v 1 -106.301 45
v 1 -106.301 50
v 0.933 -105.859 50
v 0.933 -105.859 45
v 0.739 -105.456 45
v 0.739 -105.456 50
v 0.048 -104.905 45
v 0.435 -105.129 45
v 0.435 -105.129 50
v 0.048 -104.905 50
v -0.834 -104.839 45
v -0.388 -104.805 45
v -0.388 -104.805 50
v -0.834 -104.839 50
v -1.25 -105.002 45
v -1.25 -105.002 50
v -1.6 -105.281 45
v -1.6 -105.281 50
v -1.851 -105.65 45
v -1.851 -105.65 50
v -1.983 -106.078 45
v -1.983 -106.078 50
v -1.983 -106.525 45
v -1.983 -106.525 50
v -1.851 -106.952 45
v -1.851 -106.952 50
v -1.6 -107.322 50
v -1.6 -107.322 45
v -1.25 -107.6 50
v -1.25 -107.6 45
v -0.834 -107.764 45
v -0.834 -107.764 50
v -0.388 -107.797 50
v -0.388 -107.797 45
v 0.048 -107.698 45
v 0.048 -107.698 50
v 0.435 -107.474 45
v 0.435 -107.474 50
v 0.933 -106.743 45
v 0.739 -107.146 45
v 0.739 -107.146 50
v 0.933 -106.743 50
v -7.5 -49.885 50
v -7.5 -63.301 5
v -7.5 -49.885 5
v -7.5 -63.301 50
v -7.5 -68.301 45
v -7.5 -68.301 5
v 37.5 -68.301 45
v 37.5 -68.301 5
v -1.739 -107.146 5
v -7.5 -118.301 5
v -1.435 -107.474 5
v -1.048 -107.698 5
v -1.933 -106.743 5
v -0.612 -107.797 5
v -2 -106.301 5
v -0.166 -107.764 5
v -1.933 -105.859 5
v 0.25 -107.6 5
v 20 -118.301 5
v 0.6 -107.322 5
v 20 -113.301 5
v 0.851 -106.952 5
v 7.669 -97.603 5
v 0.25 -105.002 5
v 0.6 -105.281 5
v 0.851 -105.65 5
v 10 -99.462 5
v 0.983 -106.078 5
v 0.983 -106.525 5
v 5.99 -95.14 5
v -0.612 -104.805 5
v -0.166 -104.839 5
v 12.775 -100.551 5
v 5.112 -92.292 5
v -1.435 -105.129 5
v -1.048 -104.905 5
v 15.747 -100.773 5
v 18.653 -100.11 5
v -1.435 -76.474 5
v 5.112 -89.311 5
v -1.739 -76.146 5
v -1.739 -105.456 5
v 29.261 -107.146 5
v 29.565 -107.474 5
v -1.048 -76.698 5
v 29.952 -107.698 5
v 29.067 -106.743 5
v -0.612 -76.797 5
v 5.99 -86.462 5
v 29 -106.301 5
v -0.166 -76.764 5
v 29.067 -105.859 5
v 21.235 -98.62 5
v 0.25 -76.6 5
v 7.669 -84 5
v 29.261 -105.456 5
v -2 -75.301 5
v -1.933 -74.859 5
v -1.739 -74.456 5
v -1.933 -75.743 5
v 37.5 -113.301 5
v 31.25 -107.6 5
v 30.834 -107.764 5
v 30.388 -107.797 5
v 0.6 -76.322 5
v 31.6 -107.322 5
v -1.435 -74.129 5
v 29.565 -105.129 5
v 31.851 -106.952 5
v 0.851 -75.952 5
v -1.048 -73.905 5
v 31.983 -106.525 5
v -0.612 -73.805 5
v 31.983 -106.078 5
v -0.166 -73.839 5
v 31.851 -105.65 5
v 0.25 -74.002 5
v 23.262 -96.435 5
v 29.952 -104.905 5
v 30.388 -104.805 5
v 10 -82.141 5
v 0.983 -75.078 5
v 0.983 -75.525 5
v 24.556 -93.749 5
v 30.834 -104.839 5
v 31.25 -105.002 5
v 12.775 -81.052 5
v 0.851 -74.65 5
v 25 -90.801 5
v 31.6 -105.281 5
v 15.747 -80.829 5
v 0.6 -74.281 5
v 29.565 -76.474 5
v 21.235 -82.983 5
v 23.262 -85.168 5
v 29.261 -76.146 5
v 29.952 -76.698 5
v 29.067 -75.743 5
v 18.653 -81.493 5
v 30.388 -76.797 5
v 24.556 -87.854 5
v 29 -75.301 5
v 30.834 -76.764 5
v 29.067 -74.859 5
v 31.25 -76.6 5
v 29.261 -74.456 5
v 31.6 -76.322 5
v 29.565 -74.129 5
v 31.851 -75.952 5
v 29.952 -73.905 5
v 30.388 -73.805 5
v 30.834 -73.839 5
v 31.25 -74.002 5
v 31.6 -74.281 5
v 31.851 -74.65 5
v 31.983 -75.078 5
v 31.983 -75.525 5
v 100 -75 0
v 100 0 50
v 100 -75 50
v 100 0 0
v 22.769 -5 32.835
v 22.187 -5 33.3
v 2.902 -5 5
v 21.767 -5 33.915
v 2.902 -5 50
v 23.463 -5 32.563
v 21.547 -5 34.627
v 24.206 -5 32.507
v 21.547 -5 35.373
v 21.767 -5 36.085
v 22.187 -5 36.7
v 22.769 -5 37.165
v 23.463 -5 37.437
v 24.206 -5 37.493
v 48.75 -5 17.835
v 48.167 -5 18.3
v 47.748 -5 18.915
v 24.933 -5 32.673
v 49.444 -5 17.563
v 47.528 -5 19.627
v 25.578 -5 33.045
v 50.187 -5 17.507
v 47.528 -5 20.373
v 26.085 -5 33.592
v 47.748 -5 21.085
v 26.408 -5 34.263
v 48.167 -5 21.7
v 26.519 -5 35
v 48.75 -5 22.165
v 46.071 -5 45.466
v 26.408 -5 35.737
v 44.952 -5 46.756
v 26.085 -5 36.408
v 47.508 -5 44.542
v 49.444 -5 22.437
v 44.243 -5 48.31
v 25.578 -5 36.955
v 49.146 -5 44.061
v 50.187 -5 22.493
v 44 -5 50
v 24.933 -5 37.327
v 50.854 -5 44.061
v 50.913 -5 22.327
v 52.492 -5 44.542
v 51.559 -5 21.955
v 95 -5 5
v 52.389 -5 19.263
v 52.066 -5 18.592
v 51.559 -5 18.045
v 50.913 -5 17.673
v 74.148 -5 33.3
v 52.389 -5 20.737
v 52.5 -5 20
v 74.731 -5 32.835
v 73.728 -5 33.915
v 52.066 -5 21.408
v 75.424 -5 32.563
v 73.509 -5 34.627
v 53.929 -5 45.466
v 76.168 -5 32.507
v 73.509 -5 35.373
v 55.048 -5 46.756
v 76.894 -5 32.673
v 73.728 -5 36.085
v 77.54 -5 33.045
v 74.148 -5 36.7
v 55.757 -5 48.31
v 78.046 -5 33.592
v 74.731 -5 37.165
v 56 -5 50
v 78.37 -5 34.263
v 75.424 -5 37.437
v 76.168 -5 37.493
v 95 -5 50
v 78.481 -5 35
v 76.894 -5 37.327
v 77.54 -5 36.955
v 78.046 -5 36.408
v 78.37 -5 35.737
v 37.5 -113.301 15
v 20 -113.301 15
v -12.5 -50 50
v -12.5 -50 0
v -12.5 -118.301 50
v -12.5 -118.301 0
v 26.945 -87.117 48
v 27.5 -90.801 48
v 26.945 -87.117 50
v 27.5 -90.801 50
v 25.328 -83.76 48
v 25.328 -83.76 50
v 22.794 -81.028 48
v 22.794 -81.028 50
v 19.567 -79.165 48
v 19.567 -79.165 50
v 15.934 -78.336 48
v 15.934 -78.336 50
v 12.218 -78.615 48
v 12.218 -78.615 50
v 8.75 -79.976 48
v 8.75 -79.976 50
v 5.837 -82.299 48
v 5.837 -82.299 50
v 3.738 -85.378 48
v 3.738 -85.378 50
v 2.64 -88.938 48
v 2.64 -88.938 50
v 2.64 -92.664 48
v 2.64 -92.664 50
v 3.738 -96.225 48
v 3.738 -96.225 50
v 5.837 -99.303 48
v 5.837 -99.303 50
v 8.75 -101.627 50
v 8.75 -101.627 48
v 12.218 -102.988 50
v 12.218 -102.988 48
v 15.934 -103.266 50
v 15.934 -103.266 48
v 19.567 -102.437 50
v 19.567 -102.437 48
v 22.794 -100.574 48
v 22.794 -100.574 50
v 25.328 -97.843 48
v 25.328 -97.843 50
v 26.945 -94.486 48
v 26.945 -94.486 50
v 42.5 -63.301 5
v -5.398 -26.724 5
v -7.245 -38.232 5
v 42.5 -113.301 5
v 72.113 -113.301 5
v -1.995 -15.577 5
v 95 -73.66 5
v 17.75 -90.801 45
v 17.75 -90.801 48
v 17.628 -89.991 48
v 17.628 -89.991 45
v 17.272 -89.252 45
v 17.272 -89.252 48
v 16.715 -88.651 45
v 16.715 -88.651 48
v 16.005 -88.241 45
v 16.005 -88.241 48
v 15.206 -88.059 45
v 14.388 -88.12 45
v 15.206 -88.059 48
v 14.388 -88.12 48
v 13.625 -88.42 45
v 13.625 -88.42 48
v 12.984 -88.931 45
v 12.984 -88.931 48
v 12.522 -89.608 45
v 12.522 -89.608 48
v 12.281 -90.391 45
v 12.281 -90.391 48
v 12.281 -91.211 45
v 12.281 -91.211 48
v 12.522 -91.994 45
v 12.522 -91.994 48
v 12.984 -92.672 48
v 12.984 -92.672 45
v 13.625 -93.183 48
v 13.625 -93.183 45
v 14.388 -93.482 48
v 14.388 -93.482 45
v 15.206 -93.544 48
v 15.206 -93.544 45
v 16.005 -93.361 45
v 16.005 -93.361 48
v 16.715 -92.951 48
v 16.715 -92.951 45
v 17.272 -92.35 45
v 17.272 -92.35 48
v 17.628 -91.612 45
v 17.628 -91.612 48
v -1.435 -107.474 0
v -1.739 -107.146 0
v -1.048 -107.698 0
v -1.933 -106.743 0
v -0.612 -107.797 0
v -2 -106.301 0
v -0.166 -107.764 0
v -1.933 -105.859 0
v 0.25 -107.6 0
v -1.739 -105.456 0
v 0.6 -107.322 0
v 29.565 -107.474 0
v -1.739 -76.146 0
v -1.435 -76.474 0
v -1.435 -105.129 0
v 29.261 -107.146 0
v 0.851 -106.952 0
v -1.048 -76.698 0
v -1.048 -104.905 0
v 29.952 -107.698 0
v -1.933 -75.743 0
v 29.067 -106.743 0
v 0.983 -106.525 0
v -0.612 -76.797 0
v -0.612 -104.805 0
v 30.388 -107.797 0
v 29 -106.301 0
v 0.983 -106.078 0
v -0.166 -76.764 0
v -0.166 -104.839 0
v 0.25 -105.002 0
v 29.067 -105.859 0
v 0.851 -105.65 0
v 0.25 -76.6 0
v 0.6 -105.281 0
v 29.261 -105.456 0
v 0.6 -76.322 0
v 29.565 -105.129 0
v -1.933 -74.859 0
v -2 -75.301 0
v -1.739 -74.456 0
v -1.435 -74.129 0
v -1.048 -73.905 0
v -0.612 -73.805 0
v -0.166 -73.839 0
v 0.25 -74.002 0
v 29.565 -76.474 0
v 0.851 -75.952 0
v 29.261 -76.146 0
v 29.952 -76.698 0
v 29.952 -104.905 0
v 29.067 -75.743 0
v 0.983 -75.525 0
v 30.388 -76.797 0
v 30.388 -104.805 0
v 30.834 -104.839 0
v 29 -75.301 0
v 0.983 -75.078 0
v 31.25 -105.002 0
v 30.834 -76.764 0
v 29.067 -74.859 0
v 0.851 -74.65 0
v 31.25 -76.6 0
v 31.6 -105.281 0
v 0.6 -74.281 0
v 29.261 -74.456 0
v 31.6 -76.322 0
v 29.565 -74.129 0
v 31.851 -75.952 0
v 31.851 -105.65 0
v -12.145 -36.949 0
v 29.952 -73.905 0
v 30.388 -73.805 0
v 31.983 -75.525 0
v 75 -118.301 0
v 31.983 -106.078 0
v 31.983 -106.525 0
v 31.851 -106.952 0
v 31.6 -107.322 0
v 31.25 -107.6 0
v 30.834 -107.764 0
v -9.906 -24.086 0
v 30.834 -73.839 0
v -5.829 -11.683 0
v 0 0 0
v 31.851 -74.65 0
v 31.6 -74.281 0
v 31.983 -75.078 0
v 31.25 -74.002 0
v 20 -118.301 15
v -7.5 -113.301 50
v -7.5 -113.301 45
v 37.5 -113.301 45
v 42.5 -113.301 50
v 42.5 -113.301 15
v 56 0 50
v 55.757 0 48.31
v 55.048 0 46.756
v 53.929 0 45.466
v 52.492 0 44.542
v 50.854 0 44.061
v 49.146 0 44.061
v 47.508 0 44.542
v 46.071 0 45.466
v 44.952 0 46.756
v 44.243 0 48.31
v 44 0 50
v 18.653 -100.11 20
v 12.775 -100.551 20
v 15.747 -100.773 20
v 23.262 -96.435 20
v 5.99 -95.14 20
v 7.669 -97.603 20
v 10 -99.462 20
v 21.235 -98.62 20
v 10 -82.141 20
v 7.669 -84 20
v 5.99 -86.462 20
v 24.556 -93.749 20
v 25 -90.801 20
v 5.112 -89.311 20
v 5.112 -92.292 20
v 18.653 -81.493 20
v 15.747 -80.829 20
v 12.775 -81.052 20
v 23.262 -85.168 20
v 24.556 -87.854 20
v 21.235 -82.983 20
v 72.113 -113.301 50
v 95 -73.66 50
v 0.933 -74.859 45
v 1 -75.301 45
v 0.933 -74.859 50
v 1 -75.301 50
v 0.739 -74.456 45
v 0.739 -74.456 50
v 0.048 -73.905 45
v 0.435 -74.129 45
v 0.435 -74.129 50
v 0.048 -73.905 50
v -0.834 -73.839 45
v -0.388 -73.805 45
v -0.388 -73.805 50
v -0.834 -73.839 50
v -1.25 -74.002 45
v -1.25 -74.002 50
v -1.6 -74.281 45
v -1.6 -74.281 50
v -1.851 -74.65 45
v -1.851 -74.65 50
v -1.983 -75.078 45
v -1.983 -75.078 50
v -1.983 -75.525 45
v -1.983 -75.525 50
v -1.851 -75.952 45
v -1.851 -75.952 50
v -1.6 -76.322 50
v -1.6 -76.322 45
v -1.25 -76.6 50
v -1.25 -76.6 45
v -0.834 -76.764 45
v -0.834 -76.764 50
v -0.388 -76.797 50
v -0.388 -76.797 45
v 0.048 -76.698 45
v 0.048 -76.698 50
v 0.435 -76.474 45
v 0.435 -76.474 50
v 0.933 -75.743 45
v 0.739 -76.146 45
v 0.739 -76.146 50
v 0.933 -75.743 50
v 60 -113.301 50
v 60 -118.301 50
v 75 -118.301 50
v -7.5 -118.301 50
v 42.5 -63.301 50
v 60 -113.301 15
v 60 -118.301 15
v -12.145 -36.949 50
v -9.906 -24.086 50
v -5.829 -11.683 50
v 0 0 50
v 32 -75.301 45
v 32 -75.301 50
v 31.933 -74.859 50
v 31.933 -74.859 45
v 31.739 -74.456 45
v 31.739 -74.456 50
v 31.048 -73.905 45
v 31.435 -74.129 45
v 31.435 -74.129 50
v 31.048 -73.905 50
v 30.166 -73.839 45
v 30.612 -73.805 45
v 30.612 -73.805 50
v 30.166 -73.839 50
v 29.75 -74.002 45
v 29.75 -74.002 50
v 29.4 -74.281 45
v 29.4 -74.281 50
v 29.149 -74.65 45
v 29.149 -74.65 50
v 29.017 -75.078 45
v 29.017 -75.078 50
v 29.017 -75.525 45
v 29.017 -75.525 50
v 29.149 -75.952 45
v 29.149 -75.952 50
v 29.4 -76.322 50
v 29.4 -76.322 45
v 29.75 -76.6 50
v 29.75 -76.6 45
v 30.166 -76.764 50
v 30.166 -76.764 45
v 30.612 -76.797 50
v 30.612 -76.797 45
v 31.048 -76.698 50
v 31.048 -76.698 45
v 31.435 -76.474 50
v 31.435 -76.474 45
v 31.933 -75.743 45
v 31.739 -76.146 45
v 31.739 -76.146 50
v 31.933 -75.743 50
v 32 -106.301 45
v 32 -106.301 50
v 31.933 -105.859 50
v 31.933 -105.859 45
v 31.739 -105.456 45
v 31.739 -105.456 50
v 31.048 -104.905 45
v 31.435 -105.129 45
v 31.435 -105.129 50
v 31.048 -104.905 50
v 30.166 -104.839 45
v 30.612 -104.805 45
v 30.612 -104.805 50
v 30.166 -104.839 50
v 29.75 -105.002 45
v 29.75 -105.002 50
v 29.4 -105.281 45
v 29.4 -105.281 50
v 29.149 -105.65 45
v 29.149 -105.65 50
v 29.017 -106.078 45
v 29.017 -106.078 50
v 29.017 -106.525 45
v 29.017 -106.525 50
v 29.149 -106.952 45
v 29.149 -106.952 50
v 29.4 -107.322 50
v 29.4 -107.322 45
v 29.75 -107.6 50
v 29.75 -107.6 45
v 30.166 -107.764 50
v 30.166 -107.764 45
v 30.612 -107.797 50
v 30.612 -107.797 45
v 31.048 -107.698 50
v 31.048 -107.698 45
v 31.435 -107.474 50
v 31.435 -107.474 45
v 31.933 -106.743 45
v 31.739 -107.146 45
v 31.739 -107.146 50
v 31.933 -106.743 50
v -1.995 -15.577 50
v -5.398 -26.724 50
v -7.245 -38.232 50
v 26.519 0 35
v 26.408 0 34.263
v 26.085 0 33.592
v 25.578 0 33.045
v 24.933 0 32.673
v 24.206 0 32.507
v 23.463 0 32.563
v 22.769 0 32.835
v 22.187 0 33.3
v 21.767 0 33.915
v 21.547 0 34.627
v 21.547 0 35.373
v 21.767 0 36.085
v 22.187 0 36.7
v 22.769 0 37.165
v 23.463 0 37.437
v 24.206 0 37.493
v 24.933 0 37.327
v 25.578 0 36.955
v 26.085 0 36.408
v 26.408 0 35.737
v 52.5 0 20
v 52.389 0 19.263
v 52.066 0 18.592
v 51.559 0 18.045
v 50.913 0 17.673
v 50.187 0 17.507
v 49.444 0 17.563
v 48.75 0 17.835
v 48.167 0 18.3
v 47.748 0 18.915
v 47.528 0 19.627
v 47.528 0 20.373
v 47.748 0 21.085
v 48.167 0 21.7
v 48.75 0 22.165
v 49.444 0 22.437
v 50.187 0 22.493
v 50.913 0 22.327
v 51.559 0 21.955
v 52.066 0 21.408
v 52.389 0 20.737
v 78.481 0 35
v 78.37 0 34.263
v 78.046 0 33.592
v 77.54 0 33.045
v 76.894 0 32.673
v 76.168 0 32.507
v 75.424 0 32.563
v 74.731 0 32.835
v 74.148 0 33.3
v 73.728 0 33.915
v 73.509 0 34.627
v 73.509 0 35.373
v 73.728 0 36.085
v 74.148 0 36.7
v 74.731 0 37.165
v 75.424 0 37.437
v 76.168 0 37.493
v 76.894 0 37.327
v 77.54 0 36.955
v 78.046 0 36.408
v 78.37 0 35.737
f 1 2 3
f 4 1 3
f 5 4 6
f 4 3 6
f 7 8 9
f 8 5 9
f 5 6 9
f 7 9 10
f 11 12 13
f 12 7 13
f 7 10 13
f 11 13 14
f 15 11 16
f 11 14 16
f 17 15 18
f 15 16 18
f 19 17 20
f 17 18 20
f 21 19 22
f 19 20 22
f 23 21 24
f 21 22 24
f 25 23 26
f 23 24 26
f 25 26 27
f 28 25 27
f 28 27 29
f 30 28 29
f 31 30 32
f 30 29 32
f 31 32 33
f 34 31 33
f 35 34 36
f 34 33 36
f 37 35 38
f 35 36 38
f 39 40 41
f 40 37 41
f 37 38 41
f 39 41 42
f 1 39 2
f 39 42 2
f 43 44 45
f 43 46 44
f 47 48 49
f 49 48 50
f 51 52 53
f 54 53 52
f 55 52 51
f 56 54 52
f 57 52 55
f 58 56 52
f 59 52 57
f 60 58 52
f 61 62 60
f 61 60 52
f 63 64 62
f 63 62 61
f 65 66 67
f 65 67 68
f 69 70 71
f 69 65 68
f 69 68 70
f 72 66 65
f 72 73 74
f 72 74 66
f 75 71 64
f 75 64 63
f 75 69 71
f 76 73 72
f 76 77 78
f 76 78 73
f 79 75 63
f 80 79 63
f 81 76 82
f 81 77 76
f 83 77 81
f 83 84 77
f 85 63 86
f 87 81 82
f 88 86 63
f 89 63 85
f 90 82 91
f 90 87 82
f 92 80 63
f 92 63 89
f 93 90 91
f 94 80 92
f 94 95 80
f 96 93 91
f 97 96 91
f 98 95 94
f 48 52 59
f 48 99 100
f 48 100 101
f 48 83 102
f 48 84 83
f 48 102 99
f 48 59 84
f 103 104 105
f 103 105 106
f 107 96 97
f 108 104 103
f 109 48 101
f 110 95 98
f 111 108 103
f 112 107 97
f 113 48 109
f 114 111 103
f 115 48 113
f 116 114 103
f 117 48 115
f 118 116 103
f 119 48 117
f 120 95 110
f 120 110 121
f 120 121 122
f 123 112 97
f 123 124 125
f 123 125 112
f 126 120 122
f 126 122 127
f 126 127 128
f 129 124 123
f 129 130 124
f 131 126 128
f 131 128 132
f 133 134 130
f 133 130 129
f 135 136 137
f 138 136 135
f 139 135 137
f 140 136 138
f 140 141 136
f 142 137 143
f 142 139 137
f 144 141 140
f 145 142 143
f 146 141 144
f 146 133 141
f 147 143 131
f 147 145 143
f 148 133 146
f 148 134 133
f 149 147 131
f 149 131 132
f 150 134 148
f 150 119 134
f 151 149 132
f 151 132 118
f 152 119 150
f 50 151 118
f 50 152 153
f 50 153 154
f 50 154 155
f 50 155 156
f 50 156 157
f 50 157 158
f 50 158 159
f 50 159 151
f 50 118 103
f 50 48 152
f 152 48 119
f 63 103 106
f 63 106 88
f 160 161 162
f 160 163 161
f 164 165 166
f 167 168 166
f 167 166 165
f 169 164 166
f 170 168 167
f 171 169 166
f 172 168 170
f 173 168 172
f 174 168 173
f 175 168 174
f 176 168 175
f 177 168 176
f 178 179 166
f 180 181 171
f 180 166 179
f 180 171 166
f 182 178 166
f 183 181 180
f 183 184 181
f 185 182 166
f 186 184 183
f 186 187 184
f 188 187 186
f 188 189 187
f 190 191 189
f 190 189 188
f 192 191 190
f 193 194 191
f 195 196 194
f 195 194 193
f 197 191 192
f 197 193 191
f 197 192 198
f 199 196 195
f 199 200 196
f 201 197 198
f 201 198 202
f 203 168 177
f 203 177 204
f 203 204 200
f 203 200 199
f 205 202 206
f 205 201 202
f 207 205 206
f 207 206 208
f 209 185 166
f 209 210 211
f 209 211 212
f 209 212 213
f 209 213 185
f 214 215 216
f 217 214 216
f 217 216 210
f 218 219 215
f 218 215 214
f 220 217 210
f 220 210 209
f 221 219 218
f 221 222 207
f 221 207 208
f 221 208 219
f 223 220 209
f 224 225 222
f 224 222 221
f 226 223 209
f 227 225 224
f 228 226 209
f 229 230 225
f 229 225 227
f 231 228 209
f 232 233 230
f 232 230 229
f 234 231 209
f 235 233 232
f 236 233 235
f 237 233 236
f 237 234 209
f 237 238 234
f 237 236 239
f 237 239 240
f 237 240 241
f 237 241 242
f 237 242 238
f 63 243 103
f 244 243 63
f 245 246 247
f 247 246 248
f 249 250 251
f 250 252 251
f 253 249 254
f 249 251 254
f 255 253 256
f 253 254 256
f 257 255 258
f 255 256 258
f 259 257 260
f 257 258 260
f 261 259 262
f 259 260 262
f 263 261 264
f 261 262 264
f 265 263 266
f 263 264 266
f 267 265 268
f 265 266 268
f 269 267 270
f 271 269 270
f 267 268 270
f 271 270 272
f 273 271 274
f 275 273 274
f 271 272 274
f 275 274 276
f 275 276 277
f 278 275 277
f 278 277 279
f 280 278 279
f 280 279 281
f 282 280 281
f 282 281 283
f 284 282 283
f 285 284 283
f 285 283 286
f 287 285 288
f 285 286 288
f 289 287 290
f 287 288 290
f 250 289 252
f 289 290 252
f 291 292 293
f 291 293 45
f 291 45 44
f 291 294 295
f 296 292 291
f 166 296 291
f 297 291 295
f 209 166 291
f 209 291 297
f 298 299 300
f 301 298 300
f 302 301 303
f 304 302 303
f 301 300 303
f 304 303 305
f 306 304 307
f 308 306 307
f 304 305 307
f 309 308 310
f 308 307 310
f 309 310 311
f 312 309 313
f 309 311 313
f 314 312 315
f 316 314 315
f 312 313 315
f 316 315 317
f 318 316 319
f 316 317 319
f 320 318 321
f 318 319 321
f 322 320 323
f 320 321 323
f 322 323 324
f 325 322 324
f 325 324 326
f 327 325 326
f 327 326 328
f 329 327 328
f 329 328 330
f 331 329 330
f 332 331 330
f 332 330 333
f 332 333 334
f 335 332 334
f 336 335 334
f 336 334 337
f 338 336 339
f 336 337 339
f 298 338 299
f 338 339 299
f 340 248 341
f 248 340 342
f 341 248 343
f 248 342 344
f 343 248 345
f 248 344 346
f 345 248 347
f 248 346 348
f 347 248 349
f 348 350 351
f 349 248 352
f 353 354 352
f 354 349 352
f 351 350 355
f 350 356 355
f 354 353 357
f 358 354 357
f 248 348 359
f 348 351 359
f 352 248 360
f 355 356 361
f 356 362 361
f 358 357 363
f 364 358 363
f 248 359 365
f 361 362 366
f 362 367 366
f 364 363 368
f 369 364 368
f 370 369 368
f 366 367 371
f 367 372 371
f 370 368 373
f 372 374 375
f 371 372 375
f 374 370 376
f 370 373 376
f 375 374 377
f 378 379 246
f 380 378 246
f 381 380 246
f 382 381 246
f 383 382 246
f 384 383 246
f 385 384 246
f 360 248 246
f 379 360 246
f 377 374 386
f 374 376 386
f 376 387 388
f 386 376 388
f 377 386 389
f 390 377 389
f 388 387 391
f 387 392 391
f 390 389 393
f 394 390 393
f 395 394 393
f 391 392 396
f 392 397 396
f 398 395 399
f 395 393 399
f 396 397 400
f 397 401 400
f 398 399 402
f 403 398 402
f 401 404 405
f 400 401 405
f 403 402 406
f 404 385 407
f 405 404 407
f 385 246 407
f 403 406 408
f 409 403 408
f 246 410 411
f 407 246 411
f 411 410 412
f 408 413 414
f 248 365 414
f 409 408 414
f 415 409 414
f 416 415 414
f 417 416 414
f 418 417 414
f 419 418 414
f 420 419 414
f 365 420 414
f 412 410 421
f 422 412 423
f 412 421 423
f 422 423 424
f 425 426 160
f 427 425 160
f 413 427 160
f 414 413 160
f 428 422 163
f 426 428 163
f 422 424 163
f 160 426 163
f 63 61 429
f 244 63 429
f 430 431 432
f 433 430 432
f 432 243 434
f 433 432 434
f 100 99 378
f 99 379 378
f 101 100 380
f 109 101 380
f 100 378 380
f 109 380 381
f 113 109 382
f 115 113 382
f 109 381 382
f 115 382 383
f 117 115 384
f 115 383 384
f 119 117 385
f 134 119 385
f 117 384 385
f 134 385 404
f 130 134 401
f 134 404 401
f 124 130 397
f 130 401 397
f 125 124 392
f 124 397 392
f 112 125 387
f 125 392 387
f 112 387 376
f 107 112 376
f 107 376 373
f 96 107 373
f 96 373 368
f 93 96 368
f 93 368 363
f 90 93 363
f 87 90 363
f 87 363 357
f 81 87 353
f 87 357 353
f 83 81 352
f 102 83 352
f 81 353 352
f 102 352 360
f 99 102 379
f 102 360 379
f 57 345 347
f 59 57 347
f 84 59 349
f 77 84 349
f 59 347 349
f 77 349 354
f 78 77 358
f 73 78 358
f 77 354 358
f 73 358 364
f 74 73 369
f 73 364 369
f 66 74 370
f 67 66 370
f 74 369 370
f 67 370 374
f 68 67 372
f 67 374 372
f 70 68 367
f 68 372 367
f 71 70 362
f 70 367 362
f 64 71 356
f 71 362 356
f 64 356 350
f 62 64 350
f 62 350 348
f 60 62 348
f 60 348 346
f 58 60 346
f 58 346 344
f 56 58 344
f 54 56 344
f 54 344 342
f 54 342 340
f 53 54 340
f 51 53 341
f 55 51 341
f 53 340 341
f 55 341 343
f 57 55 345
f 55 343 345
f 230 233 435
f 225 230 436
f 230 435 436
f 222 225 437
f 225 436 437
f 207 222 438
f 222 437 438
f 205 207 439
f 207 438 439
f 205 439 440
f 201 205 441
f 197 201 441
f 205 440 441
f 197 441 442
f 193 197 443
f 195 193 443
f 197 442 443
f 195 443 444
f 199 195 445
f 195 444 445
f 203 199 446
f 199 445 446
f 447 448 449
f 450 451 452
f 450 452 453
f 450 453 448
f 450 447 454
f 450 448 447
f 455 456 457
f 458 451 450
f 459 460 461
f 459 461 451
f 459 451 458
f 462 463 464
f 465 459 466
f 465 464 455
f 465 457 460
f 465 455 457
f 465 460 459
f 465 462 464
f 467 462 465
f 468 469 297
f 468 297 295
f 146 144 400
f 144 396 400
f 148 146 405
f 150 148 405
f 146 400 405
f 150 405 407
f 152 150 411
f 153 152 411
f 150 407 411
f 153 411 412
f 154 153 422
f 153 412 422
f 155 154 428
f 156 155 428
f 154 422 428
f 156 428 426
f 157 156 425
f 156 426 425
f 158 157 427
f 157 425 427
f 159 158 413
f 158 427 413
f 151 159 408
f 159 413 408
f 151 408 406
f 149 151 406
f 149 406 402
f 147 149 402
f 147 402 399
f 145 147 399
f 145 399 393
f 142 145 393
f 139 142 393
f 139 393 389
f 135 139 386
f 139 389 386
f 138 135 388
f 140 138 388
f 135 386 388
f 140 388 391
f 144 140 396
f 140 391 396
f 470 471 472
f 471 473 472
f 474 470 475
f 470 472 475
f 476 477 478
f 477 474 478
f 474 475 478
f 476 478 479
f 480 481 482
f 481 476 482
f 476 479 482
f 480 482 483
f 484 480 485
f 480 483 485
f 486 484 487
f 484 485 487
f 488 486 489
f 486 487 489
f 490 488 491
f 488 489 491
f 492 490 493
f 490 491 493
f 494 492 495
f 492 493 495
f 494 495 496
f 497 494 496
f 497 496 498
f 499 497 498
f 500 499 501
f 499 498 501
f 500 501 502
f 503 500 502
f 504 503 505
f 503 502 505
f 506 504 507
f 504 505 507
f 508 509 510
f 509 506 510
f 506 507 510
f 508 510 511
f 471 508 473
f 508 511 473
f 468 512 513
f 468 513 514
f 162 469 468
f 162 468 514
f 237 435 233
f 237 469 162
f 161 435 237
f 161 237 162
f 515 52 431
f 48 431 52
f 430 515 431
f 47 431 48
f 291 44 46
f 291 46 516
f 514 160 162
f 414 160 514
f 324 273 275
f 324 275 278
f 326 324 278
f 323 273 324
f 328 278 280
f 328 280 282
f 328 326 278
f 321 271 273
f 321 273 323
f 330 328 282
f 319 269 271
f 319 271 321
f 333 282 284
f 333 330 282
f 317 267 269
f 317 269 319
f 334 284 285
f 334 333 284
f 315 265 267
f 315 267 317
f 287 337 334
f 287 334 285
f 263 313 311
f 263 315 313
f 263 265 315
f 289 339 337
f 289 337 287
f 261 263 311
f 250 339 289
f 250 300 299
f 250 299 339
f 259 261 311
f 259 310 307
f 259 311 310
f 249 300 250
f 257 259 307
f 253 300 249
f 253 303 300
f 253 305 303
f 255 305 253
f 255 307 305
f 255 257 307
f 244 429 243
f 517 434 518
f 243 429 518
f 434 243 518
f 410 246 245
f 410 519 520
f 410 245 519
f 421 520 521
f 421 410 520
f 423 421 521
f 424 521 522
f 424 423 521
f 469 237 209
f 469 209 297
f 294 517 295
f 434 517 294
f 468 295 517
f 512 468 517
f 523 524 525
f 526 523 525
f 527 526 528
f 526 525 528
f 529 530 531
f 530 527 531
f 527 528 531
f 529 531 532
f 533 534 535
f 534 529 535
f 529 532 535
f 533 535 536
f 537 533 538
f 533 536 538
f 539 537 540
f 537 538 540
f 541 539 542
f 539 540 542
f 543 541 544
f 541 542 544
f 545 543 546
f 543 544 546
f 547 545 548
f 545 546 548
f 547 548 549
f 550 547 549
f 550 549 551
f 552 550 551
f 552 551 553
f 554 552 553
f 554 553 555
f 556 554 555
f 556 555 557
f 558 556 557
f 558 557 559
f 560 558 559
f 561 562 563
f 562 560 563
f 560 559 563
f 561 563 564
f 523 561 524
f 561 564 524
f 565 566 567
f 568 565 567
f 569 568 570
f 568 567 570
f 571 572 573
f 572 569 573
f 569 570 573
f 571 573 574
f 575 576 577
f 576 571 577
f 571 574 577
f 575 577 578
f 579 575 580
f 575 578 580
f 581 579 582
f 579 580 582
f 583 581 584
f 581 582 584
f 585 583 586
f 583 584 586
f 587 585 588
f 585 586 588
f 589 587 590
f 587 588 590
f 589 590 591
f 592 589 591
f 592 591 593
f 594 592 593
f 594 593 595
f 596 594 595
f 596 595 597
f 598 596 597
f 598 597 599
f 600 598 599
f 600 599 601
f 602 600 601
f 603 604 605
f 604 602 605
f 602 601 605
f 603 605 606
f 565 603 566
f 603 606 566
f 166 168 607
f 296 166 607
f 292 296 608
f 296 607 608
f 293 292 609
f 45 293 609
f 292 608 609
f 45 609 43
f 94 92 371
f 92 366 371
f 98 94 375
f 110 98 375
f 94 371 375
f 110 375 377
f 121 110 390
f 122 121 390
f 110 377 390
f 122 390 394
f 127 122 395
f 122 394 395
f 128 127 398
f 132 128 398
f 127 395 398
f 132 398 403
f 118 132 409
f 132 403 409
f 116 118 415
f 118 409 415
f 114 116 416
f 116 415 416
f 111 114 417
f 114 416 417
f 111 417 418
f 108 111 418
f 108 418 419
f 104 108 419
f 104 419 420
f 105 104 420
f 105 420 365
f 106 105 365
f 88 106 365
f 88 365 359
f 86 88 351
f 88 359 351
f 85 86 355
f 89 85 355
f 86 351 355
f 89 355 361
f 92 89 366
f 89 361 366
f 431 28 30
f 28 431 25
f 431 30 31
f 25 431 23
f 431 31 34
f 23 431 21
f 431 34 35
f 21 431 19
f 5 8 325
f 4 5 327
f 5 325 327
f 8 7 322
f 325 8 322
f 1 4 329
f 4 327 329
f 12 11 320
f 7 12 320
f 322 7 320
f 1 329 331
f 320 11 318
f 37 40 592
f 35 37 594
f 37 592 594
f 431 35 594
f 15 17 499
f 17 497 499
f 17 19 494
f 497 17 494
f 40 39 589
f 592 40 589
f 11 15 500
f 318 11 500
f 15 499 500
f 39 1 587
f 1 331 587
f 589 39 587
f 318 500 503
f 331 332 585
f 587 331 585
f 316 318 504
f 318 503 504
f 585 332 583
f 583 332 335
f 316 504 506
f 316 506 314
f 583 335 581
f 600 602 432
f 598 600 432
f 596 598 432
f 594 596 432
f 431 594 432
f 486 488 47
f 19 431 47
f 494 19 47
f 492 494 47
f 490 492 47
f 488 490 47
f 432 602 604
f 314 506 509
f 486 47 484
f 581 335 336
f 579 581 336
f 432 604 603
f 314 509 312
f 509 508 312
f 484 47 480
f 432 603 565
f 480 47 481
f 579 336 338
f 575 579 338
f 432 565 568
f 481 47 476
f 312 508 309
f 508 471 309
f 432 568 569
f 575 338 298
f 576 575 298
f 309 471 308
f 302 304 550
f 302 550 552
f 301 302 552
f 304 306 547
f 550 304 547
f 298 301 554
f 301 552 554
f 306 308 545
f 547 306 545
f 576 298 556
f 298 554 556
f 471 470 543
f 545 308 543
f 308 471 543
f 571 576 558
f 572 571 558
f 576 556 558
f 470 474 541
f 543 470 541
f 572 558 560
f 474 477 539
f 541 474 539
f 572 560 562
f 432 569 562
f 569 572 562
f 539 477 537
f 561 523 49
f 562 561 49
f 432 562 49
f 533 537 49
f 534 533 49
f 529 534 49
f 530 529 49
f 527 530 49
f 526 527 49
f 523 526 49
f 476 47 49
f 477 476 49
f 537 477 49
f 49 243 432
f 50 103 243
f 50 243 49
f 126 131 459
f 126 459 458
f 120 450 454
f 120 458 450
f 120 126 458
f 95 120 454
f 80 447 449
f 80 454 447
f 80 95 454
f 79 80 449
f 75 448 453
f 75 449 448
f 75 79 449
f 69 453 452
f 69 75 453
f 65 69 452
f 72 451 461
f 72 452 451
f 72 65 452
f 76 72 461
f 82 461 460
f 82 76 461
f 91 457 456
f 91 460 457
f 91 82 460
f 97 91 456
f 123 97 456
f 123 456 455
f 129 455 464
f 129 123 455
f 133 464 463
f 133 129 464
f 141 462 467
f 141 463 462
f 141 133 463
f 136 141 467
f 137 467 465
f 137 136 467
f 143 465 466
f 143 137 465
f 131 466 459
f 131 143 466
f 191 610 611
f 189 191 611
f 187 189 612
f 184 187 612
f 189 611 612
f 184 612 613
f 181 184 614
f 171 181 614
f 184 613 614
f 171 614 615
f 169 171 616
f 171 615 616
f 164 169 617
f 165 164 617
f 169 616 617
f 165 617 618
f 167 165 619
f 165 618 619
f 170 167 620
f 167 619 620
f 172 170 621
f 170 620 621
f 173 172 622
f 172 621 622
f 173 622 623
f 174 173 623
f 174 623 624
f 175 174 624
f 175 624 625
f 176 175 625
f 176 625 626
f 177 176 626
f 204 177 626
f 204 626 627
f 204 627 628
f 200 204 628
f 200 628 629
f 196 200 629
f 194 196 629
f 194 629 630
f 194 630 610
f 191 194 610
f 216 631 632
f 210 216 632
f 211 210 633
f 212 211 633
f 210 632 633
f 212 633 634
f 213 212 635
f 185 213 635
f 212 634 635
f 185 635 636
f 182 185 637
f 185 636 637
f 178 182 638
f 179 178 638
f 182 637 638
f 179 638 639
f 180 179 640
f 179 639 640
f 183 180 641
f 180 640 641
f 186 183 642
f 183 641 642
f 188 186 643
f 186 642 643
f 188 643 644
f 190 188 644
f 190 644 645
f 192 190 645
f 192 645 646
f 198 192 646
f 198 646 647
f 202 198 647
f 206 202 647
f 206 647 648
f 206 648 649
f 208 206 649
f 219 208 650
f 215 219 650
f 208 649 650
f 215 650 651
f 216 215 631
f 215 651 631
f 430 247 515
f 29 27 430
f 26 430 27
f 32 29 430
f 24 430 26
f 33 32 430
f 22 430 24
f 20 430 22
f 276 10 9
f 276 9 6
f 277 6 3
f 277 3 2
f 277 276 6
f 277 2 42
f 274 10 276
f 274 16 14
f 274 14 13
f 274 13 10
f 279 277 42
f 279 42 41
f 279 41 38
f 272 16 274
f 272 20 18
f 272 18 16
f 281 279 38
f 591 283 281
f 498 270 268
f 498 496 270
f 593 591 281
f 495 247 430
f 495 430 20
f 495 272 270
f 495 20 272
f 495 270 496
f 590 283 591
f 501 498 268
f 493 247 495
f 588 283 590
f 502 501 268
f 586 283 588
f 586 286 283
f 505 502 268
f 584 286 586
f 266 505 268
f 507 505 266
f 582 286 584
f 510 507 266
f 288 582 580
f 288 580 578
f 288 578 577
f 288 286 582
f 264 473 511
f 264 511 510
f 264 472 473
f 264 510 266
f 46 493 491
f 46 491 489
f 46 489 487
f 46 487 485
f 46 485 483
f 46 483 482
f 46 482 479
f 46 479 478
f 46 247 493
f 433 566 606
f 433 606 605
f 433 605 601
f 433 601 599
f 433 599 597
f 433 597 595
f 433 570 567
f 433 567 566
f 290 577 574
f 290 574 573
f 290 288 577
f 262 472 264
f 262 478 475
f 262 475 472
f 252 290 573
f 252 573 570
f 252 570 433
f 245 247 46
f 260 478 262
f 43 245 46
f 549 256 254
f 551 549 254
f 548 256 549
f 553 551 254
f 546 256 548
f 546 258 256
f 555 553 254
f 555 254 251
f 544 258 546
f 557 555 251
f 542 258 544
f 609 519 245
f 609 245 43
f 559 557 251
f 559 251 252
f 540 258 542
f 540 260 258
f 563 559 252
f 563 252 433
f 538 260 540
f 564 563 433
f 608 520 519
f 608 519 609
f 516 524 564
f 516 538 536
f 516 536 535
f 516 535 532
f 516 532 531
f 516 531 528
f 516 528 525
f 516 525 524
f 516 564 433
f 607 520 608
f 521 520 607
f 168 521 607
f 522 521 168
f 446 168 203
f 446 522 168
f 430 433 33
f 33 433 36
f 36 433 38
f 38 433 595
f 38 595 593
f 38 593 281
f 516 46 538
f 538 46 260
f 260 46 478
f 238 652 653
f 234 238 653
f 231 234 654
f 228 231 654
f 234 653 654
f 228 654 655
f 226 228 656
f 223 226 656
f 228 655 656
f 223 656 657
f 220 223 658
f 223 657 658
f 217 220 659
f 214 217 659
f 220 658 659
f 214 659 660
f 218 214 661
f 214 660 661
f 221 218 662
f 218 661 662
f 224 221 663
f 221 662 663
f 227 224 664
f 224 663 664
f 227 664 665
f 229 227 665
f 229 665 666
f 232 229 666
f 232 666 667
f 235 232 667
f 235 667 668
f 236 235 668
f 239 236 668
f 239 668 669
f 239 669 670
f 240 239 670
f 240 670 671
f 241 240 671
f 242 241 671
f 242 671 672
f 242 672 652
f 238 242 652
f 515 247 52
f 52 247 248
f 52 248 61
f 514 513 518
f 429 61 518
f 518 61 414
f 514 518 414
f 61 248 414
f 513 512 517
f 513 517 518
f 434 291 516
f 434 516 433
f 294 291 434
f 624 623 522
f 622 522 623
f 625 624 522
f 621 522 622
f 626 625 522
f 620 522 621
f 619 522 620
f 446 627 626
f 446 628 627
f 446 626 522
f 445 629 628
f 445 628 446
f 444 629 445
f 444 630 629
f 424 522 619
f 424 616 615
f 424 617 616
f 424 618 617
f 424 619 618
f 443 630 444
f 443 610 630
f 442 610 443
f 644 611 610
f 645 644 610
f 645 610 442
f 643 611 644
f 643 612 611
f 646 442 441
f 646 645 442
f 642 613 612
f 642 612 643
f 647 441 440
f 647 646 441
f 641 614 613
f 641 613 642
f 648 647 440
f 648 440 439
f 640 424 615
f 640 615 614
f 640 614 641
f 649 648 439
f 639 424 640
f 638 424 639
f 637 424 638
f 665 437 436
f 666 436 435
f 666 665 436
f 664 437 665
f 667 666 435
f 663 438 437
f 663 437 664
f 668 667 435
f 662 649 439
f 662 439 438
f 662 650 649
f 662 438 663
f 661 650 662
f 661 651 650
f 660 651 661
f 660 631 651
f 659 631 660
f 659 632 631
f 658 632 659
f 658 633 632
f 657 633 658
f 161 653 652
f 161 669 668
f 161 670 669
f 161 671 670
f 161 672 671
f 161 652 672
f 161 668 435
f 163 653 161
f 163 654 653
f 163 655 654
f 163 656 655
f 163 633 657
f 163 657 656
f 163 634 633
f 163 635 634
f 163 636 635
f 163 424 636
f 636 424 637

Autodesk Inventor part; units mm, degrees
ref_plane "YZ Plane" through (0, 0, 0) normal (1, 0, 0) x (0, 1, 0)
ref_plane "XZ Plane" through (0, 0, 0) normal (0, 1, 0) x (-1, 0, 0)
ref_plane "XY Plane" through (0, 0, 0) normal (0, 0, 1) x (1, 0, 0)
sketch "Sketch1" plane through (0, 0, 0) normal (0, 0, 1) x (1, 0, 0)
  line L0 (0, 0) -> (100, 0)
  line L1 (100, 0) -> (100, -75)
  line L2 (100, -75) -> (75, -118.3013)
  line L3 (-12.5, -50) -> (-12.5, -118.3013)
  arc A0 (0, 0) -> (-12.5, -50) centre (77.4072, -45.9143) ccw
  line L4 (-12.5, -118.3013) -> (75, -118.3013)
  dimension "d0" = 100
  dimension "d1" = 75
  dimension "d2" = 50
  dimension "d3" = 150
  dimension "d4" = 12.5
  dimension "d5" = 50
  dimension "d6" = 90
extrude "Extrusion1" add sketch "Sketch1" along normal blind 50
sketch "Sketch2" plane through (0, 0, 50) normal (0, 0, 1) x (1, 0, 0)
  line L0 (100, 0) -> (0, 0) projected
  arc A0 (0, 0) -> (-12.5, -50) centre (77.4072, -45.9143) ccw projected
  line L1 (-12.5, -50) -> (-12.5, -118.3013) projected
  line L2 (-12.5, -118.3013) -> (75, -118.3013) projected
  line L3 (75, -118.3013) -> (100, -75) projected
  line L4 (100, -75) -> (100, 0) projected
  arc A1 (2.902, -5) -> (-7.5, -49.8848) centre (77.4072, -45.9143) ccw
  line L5 (2.902, -5) -> (95, -5)
  line L6 (95, -5) -> (95, -73.6603)
  line L7 (95, -73.6603) -> (72.1132, -113.3013)
  line L8 (72.1132, -113.3013) -> (-7.5, -113.3013)
  line L9 (-7.5, -113.3013) -> (-7.5, -49.8848)
  dimension "d9" = 5
extrude "Extrusion2" cut sketch "Sketch2" against normal blind 45 contours L5 L6 L7 L8 L9 A1
sketch "Sketch3" plane through (0, 0, 50) normal (0, 0, 1) x (1, 0, 0)
  line L0 (72.1132, -113.3013) -> (-7.5, -113.3013) projected
  line L1 (-12.5, -118.3013) -> (75, -118.3013) projected
  line L2 (-7.5, -113.3013) -> (60, -113.3013)
  line L3 (60, -113.3013) -> (60, -118.3013)
  line L4 (60, -118.3013) -> (-7.5, -118.3013)
  line L5 (-7.5, -118.3013) -> (-7.5, -113.3013)
  point P0 (0, 0)
  dimension "d13" = 15
extrude "Extrusion3" cut sketch "Sketch3" against normal blind 45
sketch "Sketch4" plane through (0, 0, 0) normal (0, 1, 0) x (1, 0, 0)
  circle A0 centre (50, -50) radius 6
  line L0 (100, -50) -> (0, -50) projected
  point P0 (0, 0)
  dimension "d16" = 12
extrude "Extrusion4" cut sketch "Sketch4" against normal through all
sketch "Sketch5" plane through (0, 0, 0) normal (0, 1, 0) x (1, 0, 0)
  arc A0 (56, -50) -> (44, -50) centre (50, -50) ccw projected
  circle A1 centre (50, -50) radius 30 construction
  circle A2 centre (50, -20) radius 2.5
  circle A3 centre (24.0192, -35) radius 2.5
  circle A4 centre (24.0192, -65) radius 2.5
  circle A5 centre (50, -80) radius 2.5
  circle A6 centre (75.9808, -65) radius 2.5
  circle A7 centre (75.9808, -35) radius 2.5
  point P0 (0, 0)
  dimension "d20" = 60
  dimension "d21" = 5
  dimension "d24" = 360
extrude "Extrusion5" cut sketch "Sketch5" against normal blind 5 contours A2 | A3 | A7
sketch "Sketch6" plane through (0, 0, 50) normal (0, 0, 1) x (1, 0, 0)
  line L0 (-7.5, -113.3013) -> (37.5, -113.3013)
  line L1 (37.5, -113.3013) -> (37.5, -68.3013)
  line L2 (37.5, -68.3013) -> (-7.5, -68.3013)
  line L3 (-7.5, -68.3013) -> (-7.5, -113.3013)
  circle A0 centre (15, -90.8013) radius 2.75
  line L4 (-0.5, -106.3013) -> (30.5, -106.3013) construction
  line L5 (30.5, -106.3013) -> (30.5, -75.3013) construction
  line L6 (30.5, -75.3013) -> (-0.5, -75.3013) construction
  line L7 (-0.5, -75.3013) -> (-0.5, -106.3013) construction
  line L8 (-0.5, -106.3013) -> (30.5, -75.3013) construction
  line L9 (30.5, -106.3013) -> (-0.5, -75.3013) construction
  circle A1 centre (30.5, -75.3013) radius 1.5
  circle A2 centre (-0.5, -75.3013) radius 1.5
  circle A3 centre (-0.5, -106.3013) radius 1.5
  circle A4 centre (30.5, -106.3013) radius 1.5
  point P0 (0, 0)
  point P1 (15, -90.8013)
  point P2 (15, -68.3013)
  point P3 (15, -90.8013)
  point P4 (37.5, -90.8013)
  point P5 (-7.5, -118.3013)
  dimension "d29" = 45
  dimension "d30" = 45
  dimension "d31" = 5.5
  dimension "d32" = 31
  dimension "d33" = 31
  dimension "d34" = 3
  dimension "d35" = 3
  dimension "d36" = 3
  dimension "d37" = 3
  dimension "d61" = 5
extrude "Extrusion6" add sketch "Sketch6" against normal blind 5
sketch "Sketch7" plane through (0, 0, 50) normal (0, 0, 1) x (1, 0, 0)
  circle A0 centre (15, -90.8013) radius 2.75 projected
  circle A1 centre (15, -90.8013) radius 12.5
  point P0 (0, 0)
  dimension "d40" = 25
extrude "Extrusion7" cut sketch "Sketch7" against normal blind 2
sketch "Sketch8" plane through (-7.5, -68.3013, 50) normal (0, 1, 0) x (1, 0, 0)
  line L0 (45, 0) -> (45, 5) projected
  line L1 (82.5, 50) -> (-5, 50) projected
  line L2 (45, 0) -> (-5, 0)
  line L3 (-5, 0) -> (-5, 50)
  line L4 (-5, 50) -> (45, 50)
  line L5 (45, 50) -> (45, 0)
  point P0 (7.5, 50)
extrude "Extrusion8" add sketch "Sketch8" along normal blind 5
sketch "Sketch10" plane through (-12.5, -118.3013, 0) normal (0, -1, 0) x (1, 0, 0)
  line L0 (87.5, 0) -> (87.5, 50) projected
  line L1 (87.5, 0) -> (0, 0) projected
  line L2 (87.5, 0) -> (32.5, 0)
  line L3 (32.5, 0) -> (32.5, 15)
  line L4 (32.5, 15) -> (87.5, 15)
  line L5 (87.5, 15) -> (87.5, 0)
  line L6 (0, 0) -> (0, 50) projected
  point P0 (12.5, 0)
  dimension "d49" = 15
  dimension "d50" = 32.5
extrude "Extrusion10" add sketch "Sketch10" against normal blind 5
sketch "Sketch14" plane through (0, 0, 0) normal (0, 0, -1) x (-1, 0, 0)
  circle A0 centre (-15, -90.8013) radius 2.75 projected
  circle A1 centre (0.5, -75.3013) radius 1.5 projected
  circle A2 centre (0.5, -106.3013) radius 1.5 projected
  circle A3 centre (-30.5, -106.3013) radius 1.5 projected
  circle A4 centre (-30.5, -75.3013) radius 1.5 projected
  point P0 (0, 0)
extrude "Extrusion13" cut sketch "Sketch14" against normal through all contours A1 | A2 | A3 | A4
sketch "Sketch15" plane through (0, 0, 5) normal (0, 0, 1) x (1, 0, 0)
  line L0 (20, -113.3013) -> (60, -113.3013) projected
  line L1 (37.5, -63.3013) -> (42.5, -63.3013)
  line L2 (42.5, -63.3013) -> (42.5, -113.3013)
  line L3 (42.5, -113.3013) -> (37.5, -113.3013)
  line L4 (37.5, -113.3013) -> (37.5, -63.3013)
  point P0 (0, 0)
  dimension "d62" = 5
extrude "Extrusion14" add sketch "Sketch15" along normal blind 45
sketch "Sketch16" plane through (0, 0, 5) normal (0, 0, 1) x (1, 0, 0)
  circle A0 centre (15, -90.8013) radius 10
  point P0 (0, 0)
  dimension "d65" = 20
extrude "Extrusion15" add sketch "Sketch16" along normal blind 15
properties part number "FA001" material "ABS Plastic"
